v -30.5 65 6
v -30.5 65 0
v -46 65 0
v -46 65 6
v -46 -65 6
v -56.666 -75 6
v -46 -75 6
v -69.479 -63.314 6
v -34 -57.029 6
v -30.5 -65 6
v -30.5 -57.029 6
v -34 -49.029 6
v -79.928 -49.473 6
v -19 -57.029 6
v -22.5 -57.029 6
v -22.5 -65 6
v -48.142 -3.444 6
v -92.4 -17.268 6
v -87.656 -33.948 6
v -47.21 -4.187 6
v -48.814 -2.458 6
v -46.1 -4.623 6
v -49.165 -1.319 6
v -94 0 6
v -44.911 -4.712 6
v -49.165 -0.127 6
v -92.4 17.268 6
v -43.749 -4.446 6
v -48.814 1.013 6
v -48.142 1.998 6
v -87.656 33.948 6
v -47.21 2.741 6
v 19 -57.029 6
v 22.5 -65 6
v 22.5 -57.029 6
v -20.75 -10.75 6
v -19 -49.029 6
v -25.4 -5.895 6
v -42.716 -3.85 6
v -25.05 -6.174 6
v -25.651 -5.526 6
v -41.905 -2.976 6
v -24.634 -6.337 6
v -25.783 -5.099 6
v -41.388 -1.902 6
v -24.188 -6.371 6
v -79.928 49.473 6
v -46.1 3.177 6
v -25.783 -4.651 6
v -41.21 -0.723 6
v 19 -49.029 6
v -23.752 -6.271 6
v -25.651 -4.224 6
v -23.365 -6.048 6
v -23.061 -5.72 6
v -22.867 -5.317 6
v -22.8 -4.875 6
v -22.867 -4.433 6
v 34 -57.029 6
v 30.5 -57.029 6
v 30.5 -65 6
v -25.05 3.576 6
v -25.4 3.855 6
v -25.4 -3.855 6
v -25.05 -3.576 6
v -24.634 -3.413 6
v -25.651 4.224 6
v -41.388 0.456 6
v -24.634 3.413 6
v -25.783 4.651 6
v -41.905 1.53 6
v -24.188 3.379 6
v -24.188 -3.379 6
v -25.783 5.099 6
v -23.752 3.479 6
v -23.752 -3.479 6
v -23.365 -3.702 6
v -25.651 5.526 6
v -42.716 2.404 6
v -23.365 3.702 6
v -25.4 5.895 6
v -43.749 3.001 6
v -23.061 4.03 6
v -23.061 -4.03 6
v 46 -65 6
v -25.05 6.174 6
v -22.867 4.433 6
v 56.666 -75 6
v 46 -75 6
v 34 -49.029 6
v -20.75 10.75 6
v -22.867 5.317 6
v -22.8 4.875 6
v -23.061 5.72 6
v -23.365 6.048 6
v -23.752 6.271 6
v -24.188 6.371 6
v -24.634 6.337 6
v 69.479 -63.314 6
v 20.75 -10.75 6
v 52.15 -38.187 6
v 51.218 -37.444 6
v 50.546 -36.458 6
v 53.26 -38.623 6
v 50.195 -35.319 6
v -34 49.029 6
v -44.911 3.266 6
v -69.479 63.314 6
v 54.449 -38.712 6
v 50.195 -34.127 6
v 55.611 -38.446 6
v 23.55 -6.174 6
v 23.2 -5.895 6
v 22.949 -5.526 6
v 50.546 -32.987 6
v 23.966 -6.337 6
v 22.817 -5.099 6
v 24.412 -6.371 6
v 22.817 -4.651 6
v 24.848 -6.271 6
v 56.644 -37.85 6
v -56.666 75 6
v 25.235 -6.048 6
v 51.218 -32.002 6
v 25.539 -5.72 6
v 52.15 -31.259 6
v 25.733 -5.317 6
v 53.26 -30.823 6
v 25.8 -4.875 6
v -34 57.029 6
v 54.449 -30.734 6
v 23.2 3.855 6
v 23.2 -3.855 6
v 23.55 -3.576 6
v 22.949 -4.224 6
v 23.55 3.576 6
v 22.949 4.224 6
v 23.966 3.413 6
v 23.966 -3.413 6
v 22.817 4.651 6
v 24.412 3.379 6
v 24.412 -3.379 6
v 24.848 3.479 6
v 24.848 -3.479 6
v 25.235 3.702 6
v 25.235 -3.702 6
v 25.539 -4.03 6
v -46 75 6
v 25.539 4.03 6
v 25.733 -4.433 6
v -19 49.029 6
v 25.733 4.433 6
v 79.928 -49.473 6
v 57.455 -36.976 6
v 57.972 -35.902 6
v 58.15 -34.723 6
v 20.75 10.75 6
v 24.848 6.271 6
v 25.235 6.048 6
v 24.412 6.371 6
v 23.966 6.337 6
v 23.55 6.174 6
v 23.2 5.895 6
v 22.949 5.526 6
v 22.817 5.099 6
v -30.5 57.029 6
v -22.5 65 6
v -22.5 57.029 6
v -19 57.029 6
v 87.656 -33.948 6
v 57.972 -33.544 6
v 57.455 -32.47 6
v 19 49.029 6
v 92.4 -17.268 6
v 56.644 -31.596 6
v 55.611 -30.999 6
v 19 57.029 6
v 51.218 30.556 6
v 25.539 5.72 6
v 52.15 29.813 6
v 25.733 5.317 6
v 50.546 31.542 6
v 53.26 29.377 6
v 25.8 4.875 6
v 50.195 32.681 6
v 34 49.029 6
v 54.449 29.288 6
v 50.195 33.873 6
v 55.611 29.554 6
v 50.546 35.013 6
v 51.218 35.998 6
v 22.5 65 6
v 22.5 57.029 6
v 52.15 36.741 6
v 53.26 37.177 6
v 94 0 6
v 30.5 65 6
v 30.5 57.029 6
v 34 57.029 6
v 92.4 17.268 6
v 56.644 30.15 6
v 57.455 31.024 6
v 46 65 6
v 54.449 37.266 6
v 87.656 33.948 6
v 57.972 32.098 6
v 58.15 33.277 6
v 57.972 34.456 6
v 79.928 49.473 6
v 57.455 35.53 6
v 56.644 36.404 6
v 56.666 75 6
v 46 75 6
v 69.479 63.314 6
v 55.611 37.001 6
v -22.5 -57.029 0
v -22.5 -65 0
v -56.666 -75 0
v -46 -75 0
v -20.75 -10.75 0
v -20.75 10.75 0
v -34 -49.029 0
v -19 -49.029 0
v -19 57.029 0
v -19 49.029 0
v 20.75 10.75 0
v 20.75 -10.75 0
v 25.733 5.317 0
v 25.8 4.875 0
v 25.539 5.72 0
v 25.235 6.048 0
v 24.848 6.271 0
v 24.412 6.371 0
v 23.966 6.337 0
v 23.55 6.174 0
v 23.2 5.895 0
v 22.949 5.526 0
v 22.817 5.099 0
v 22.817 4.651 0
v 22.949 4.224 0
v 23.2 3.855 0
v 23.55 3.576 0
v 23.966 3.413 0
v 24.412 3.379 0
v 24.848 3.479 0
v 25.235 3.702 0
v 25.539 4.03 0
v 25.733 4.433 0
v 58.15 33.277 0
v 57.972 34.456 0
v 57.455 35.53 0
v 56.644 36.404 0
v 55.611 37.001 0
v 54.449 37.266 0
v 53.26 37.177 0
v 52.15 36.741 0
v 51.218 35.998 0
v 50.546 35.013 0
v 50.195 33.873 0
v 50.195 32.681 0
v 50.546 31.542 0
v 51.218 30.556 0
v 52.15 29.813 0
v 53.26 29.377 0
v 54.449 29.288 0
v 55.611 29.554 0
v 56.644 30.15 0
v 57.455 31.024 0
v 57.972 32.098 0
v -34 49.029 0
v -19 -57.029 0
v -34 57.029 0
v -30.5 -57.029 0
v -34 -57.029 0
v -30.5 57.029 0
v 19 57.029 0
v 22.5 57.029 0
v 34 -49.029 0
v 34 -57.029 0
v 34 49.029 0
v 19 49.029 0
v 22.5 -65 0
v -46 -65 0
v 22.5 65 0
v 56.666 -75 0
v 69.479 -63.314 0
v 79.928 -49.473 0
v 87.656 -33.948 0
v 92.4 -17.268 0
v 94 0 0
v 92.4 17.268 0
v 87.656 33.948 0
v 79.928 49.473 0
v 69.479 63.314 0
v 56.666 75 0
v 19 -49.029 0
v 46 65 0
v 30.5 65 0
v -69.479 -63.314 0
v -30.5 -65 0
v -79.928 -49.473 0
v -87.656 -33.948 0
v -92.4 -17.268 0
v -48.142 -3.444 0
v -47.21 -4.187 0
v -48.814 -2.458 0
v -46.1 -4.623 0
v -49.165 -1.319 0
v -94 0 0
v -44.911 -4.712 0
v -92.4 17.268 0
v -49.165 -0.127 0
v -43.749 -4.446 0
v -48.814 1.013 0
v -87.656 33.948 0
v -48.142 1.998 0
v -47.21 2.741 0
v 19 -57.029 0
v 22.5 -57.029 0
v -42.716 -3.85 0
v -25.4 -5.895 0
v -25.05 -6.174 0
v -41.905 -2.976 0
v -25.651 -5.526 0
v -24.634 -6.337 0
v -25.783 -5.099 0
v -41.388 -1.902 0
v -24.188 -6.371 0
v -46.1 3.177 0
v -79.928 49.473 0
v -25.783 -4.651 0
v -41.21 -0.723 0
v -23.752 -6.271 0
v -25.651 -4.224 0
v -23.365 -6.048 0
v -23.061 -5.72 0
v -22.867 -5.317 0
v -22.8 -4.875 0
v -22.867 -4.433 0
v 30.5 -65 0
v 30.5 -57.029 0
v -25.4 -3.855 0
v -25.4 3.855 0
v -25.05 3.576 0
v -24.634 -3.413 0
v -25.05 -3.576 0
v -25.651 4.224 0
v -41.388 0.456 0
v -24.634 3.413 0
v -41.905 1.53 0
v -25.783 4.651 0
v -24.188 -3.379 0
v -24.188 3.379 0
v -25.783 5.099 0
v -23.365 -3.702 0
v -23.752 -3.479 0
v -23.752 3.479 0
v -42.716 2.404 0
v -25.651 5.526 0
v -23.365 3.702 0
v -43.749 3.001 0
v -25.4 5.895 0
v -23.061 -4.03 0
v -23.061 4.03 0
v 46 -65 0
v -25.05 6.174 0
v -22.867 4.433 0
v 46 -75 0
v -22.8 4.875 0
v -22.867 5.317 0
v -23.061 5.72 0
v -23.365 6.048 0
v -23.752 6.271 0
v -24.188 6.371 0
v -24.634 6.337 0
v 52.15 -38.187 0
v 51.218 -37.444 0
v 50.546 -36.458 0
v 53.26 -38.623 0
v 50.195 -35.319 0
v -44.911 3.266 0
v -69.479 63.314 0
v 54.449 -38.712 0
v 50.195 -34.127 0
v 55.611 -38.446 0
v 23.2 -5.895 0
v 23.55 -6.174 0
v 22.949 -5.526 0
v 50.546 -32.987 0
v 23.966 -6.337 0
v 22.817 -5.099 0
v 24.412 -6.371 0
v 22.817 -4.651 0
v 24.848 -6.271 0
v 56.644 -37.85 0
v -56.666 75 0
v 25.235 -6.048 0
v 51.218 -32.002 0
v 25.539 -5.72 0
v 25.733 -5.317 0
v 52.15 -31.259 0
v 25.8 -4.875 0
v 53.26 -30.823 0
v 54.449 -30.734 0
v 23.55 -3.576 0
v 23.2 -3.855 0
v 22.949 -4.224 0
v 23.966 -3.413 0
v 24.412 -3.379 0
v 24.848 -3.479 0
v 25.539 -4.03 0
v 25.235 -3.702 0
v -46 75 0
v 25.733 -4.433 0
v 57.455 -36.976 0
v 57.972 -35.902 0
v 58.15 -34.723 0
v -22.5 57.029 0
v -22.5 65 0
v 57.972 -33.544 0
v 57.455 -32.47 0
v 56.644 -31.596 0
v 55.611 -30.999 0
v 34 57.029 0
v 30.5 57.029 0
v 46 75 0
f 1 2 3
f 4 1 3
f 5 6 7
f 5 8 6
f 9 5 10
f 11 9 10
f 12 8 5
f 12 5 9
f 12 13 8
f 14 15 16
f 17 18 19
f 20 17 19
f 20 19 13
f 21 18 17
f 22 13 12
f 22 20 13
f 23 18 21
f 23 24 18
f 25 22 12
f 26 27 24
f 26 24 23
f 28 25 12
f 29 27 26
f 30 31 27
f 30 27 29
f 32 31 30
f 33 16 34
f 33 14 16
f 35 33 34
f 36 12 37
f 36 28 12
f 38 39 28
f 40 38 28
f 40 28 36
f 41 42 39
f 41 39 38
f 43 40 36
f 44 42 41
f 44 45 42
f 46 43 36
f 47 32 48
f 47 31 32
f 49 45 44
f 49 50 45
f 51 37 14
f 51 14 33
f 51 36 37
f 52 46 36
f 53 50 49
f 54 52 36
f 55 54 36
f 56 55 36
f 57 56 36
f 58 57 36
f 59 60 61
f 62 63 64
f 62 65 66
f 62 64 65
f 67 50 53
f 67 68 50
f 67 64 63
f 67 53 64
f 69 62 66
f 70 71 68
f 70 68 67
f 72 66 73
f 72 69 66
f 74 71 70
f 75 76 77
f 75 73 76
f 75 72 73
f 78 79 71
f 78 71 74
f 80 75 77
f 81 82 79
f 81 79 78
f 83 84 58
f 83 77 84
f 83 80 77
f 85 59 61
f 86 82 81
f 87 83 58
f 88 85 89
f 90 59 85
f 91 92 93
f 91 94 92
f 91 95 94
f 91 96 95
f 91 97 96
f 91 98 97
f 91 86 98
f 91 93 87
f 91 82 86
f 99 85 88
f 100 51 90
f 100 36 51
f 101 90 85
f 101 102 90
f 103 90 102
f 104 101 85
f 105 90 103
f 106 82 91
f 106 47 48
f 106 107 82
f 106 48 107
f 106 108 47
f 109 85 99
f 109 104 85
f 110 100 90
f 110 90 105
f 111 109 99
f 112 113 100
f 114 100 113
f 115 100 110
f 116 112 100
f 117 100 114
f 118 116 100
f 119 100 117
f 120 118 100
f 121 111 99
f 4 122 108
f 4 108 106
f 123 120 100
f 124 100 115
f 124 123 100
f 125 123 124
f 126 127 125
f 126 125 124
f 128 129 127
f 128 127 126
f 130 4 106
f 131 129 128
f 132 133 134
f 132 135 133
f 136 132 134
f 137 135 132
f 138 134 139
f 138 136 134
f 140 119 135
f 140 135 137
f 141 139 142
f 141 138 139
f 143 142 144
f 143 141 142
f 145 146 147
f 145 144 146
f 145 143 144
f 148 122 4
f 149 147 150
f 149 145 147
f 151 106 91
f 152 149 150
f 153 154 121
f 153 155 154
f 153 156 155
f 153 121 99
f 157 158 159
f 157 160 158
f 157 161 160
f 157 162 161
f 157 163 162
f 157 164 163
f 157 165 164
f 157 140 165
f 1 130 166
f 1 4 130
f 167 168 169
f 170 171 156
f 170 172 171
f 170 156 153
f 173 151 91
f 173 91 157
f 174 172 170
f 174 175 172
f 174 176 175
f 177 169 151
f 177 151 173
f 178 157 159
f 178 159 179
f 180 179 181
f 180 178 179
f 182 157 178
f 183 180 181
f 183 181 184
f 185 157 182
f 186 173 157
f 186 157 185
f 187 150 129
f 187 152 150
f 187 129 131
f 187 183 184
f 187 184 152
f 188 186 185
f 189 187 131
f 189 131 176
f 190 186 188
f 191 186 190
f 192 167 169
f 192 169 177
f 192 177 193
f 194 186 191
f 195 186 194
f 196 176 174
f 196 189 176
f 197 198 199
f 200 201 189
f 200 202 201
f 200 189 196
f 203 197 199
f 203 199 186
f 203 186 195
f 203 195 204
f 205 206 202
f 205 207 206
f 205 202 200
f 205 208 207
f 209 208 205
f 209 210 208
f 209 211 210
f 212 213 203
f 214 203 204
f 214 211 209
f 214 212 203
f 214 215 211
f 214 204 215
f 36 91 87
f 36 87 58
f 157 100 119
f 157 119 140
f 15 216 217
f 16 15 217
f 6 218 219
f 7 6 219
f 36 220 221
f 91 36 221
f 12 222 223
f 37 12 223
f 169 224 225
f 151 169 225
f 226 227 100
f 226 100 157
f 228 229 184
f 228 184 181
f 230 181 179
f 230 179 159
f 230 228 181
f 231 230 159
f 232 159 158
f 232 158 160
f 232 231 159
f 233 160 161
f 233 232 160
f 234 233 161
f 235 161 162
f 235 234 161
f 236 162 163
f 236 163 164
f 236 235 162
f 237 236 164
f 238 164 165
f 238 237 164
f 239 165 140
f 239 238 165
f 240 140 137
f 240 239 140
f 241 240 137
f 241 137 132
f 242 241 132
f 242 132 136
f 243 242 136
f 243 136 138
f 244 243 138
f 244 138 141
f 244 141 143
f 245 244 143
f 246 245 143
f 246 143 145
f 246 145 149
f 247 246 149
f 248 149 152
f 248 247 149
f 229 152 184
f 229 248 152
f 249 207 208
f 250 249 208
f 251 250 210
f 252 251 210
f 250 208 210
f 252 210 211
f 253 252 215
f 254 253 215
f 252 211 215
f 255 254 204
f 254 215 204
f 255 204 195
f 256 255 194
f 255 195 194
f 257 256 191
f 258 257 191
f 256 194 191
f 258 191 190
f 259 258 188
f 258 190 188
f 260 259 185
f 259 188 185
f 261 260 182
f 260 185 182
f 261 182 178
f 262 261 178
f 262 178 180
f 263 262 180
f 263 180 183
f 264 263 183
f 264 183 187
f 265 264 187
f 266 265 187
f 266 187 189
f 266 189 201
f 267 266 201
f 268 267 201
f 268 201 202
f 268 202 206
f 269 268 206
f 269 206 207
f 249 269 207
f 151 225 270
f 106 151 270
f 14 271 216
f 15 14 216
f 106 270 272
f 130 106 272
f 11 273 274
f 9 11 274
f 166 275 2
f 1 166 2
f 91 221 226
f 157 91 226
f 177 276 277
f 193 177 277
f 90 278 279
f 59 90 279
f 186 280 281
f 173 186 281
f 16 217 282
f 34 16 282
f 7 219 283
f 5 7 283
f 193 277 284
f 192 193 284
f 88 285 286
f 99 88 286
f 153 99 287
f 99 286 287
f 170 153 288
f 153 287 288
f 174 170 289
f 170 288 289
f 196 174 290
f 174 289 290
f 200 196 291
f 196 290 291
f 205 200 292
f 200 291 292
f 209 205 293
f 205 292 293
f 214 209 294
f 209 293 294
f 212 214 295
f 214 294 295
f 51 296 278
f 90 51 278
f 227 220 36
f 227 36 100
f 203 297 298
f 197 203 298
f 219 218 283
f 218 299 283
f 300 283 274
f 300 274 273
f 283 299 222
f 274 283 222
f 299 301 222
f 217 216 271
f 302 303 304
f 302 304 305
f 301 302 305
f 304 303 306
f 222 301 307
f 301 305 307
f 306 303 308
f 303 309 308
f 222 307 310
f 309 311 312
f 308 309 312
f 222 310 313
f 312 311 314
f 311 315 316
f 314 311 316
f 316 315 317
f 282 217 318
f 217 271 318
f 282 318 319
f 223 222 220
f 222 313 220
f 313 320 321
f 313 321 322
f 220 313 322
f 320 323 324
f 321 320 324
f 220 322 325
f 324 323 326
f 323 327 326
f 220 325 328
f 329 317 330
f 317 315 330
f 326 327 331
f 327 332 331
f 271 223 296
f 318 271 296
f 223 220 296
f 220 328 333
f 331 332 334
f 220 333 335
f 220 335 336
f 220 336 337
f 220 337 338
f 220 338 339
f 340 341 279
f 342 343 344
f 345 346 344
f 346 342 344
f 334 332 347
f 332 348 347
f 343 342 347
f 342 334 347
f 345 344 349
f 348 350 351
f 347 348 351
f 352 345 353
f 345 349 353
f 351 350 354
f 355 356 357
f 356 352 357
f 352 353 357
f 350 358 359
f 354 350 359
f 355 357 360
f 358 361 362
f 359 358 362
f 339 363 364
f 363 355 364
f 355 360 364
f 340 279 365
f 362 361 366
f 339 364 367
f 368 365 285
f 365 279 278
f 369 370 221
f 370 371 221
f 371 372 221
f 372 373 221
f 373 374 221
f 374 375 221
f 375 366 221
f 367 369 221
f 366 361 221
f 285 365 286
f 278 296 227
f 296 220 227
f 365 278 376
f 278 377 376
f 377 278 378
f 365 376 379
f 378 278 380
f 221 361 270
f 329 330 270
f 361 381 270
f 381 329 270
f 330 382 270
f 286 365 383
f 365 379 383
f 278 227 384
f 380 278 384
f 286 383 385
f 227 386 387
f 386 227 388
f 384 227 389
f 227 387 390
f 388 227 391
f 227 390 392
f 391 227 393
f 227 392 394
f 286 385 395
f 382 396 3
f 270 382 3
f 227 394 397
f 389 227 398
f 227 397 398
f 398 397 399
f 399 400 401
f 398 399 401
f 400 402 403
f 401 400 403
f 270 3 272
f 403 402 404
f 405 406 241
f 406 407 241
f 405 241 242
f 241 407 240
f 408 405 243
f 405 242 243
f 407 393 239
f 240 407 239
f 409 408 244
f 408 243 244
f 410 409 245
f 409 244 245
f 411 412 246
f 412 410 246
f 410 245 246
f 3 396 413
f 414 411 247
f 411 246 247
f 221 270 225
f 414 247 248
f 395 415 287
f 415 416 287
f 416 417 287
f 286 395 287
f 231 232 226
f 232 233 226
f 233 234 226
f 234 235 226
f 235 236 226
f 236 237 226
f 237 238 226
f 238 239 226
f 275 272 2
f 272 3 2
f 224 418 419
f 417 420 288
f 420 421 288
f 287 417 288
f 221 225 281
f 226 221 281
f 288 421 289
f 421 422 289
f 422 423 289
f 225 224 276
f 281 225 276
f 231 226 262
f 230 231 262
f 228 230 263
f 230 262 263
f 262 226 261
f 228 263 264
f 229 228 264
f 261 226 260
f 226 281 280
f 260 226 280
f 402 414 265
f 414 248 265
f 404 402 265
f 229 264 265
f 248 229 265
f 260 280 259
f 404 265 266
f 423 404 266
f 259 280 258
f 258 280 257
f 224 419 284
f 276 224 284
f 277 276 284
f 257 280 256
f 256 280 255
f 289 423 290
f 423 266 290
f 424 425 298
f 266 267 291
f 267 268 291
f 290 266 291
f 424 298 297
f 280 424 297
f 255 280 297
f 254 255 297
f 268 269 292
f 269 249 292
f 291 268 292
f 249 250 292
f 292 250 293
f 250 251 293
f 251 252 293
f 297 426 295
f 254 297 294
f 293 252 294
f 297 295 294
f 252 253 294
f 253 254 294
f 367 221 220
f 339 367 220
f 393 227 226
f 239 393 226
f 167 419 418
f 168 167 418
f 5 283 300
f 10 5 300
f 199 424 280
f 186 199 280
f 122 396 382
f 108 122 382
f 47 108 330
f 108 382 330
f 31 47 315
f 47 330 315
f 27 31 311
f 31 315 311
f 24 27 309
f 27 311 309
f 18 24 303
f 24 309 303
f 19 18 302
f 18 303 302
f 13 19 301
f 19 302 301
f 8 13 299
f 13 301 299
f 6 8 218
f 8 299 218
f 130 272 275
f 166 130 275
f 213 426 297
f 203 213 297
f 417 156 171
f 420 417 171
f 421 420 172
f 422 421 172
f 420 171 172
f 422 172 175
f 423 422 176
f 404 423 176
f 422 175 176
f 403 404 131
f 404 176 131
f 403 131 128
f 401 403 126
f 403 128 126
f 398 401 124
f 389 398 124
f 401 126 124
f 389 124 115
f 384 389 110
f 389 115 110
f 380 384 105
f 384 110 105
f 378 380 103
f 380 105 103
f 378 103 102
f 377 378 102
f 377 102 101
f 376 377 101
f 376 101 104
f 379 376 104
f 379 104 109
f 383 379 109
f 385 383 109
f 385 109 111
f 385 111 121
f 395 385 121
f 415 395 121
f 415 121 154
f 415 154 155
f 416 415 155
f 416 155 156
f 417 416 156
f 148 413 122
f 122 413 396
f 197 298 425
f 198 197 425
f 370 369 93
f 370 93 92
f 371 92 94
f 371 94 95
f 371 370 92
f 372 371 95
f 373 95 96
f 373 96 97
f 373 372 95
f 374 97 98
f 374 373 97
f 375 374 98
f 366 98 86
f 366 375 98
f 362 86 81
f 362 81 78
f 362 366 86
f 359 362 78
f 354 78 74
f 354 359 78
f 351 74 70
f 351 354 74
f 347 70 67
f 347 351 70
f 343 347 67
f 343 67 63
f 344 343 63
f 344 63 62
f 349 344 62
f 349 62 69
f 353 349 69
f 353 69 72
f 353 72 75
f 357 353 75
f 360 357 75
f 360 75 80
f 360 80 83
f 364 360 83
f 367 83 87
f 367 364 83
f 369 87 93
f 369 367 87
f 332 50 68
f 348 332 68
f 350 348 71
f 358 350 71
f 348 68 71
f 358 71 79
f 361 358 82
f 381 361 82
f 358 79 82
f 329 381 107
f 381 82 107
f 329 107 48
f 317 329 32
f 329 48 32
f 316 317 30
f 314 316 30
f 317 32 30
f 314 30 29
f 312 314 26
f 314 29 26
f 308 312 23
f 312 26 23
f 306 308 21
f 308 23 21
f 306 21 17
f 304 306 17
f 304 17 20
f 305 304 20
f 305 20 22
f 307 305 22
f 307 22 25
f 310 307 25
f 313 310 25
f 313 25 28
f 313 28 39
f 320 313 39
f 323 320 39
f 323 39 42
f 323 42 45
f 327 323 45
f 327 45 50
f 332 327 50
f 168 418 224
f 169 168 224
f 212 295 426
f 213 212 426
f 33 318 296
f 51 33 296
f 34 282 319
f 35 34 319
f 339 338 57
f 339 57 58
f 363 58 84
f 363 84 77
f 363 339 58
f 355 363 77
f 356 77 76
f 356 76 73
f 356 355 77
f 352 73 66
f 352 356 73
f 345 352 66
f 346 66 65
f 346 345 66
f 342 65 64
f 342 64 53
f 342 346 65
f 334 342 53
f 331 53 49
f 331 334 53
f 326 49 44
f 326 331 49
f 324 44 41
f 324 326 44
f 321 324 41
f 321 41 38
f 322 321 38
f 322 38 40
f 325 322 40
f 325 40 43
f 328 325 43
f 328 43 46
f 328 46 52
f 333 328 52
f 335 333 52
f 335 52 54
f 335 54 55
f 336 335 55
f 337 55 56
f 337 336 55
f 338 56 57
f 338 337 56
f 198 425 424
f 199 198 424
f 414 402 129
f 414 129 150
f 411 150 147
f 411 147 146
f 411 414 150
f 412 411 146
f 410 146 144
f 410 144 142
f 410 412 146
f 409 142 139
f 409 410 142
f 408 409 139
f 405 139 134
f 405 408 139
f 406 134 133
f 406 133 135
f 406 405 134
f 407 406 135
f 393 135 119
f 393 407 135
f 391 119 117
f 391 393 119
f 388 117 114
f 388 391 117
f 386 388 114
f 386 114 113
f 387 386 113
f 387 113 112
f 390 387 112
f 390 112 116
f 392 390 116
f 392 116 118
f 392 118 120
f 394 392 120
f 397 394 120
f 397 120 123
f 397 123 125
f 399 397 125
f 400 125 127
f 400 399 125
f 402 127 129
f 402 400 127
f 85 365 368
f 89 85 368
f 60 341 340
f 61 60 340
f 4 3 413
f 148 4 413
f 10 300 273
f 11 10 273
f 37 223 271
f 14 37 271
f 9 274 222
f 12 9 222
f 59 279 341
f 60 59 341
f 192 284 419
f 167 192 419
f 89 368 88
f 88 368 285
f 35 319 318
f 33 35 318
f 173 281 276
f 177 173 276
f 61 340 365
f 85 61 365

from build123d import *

# Parameters (mm, degrees)
SKETCH8_R               = 1.5
SKETCH8_W               = 41.5
SKETCH8_H               = 21.5
BOSS_EXTRUDE1_DEPTH     = 6
SKETCH10_R              = 4
CUT_EXTRUDE2_DEPTH      = 1
CUT_EXTRUDE2_DEPTH_BACK = 7


with BuildPart() as part:
    # Sketch8 → Boss-Extrude1 (new body)
    with BuildSketch(Plane.XY):
        with BuildLine():
            Line((-56.665686266, -75), (-46, -75))
            Line((-46, -75), (-46, -65))
            Line((-46, -65), (-30.5, -65))
            Line((-30.5, -65), (-30.5, -57.029309822))
            Line((-30.5, -57.029309822), (-34, -57.029309822))
            Line((-34, -57.029309822), (-34, -49.029309822))
            Line((-34, -49.029309822), (-19, -49.029309822))
            Line((-19, -49.029309822), (-19, -57.029309822))
            Line((-19, -57.029309822), (-22.5, -57.029309822))
            Line((-22.5, -57.029309822), (-22.5, -65))
            Line((-22.5, -65), (22.5, -65))
            Line((22.5, -65), (22.5, -57.029309822))
            Line((22.5, -57.029309822), (19, -57.029309822))
            Line((19, -57.029309822), (19, -49.029309822))
            Line((19, -49.029309822), (34, -49.029309822))
            Line((34, -49.029309822), (34, -57.029309822))
            Line((34, -57.029309822), (30.5, -57.029309822))
            Line((30.5, -57.029309822), (30.5, -65))
            Line((30.5, -65), (46, -65))
            Line((46, -65), (46, -75))
            Line((46, -75), (56.665686266, -75))
            ThreePointArc((56.665686266, -75), (94, 0), (56.665686266, 75))
            Line((56.665686266, 75), (46, 75))
            Line((46, 75), (46, 65))
            Line((46, 65), (30.5, 65))
            Line((30.5, 65), (30.5, 57.029309822))
            Line((30.5, 57.029309822), (34, 57.029309822))
            Line((34, 57.029309822), (34, 49.029309822))
            Line((34, 49.029309822), (19, 49.029309822))
            Line((19, 49.029309822), (19, 57.029309822))
            Line((19, 57.029309822), (22.5, 57.029309822))
            Line((22.5, 57.029309822), (22.5, 65))
            Line((22.5, 65), (-22.5, 65))
            Line((-22.5, 65), (-22.5, 57.029309822))
            Line((-22.5, 57.029309822), (-19, 57.029309822))
            Line((-19, 57.029309822), (-19, 49.029309822))
            Line((-19, 49.029309822), (-34, 49.029309822))
            Line((-34, 49.029309822), (-34, 57.029309822))
            Line((-34, 57.029309822), (-30.5, 57.029309822))
            Line((-30.5, 57.029309822), (-30.5, 65))
            Line((-30.5, 65), (-46, 65))
            Line((-46, 65), (-46, 75))
            Line((-46, 75), (-56.665686266, 75))
            ThreePointArc((-56.665686266, 75), (-94, 0), (-56.665686266, -75))
        make_face()
        with Locations((-24.3, -4.875)):
            Circle(SKETCH8_R, mode=Mode.SUBTRACT)
        with Locations((-24.3, 4.875)):
            Circle(SKETCH8_R, mode=Mode.SUBTRACT)
        with Locations((24.3, 4.875)):
            Circle(SKETCH8_R, mode=Mode.SUBTRACT)
        with Locations((24.3, -4.875)):
            Circle(SKETCH8_R, mode=Mode.SUBTRACT)
        Rectangle(SKETCH8_W, SKETCH8_H, mode=Mode.SUBTRACT)
    extrude(amount=BOSS_EXTRUDE1_DEPTH)

    # Sketch10 → Cut-Extrude2 (cut, two sides)
    with BuildSketch(Plane.XY.offset(6)) as cut_extrude2_sk:
        with Locations((54.15, -34.722964698)):
            Circle(SKETCH10_R)
        with Locations((54.15, 33.277035302)):
            Circle(SKETCH10_R)
        with Locations((-45.21, -0.722964698)):
            Circle(SKETCH10_R)
    extrude(amount=CUT_EXTRUDE2_DEPTH, mode=Mode.SUBTRACT)
    extrude(cut_extrude2_sk.sketch, amount=-CUT_EXTRUDE2_DEPTH_BACK, mode=Mode.SUBTRACT)


solid = part.part
